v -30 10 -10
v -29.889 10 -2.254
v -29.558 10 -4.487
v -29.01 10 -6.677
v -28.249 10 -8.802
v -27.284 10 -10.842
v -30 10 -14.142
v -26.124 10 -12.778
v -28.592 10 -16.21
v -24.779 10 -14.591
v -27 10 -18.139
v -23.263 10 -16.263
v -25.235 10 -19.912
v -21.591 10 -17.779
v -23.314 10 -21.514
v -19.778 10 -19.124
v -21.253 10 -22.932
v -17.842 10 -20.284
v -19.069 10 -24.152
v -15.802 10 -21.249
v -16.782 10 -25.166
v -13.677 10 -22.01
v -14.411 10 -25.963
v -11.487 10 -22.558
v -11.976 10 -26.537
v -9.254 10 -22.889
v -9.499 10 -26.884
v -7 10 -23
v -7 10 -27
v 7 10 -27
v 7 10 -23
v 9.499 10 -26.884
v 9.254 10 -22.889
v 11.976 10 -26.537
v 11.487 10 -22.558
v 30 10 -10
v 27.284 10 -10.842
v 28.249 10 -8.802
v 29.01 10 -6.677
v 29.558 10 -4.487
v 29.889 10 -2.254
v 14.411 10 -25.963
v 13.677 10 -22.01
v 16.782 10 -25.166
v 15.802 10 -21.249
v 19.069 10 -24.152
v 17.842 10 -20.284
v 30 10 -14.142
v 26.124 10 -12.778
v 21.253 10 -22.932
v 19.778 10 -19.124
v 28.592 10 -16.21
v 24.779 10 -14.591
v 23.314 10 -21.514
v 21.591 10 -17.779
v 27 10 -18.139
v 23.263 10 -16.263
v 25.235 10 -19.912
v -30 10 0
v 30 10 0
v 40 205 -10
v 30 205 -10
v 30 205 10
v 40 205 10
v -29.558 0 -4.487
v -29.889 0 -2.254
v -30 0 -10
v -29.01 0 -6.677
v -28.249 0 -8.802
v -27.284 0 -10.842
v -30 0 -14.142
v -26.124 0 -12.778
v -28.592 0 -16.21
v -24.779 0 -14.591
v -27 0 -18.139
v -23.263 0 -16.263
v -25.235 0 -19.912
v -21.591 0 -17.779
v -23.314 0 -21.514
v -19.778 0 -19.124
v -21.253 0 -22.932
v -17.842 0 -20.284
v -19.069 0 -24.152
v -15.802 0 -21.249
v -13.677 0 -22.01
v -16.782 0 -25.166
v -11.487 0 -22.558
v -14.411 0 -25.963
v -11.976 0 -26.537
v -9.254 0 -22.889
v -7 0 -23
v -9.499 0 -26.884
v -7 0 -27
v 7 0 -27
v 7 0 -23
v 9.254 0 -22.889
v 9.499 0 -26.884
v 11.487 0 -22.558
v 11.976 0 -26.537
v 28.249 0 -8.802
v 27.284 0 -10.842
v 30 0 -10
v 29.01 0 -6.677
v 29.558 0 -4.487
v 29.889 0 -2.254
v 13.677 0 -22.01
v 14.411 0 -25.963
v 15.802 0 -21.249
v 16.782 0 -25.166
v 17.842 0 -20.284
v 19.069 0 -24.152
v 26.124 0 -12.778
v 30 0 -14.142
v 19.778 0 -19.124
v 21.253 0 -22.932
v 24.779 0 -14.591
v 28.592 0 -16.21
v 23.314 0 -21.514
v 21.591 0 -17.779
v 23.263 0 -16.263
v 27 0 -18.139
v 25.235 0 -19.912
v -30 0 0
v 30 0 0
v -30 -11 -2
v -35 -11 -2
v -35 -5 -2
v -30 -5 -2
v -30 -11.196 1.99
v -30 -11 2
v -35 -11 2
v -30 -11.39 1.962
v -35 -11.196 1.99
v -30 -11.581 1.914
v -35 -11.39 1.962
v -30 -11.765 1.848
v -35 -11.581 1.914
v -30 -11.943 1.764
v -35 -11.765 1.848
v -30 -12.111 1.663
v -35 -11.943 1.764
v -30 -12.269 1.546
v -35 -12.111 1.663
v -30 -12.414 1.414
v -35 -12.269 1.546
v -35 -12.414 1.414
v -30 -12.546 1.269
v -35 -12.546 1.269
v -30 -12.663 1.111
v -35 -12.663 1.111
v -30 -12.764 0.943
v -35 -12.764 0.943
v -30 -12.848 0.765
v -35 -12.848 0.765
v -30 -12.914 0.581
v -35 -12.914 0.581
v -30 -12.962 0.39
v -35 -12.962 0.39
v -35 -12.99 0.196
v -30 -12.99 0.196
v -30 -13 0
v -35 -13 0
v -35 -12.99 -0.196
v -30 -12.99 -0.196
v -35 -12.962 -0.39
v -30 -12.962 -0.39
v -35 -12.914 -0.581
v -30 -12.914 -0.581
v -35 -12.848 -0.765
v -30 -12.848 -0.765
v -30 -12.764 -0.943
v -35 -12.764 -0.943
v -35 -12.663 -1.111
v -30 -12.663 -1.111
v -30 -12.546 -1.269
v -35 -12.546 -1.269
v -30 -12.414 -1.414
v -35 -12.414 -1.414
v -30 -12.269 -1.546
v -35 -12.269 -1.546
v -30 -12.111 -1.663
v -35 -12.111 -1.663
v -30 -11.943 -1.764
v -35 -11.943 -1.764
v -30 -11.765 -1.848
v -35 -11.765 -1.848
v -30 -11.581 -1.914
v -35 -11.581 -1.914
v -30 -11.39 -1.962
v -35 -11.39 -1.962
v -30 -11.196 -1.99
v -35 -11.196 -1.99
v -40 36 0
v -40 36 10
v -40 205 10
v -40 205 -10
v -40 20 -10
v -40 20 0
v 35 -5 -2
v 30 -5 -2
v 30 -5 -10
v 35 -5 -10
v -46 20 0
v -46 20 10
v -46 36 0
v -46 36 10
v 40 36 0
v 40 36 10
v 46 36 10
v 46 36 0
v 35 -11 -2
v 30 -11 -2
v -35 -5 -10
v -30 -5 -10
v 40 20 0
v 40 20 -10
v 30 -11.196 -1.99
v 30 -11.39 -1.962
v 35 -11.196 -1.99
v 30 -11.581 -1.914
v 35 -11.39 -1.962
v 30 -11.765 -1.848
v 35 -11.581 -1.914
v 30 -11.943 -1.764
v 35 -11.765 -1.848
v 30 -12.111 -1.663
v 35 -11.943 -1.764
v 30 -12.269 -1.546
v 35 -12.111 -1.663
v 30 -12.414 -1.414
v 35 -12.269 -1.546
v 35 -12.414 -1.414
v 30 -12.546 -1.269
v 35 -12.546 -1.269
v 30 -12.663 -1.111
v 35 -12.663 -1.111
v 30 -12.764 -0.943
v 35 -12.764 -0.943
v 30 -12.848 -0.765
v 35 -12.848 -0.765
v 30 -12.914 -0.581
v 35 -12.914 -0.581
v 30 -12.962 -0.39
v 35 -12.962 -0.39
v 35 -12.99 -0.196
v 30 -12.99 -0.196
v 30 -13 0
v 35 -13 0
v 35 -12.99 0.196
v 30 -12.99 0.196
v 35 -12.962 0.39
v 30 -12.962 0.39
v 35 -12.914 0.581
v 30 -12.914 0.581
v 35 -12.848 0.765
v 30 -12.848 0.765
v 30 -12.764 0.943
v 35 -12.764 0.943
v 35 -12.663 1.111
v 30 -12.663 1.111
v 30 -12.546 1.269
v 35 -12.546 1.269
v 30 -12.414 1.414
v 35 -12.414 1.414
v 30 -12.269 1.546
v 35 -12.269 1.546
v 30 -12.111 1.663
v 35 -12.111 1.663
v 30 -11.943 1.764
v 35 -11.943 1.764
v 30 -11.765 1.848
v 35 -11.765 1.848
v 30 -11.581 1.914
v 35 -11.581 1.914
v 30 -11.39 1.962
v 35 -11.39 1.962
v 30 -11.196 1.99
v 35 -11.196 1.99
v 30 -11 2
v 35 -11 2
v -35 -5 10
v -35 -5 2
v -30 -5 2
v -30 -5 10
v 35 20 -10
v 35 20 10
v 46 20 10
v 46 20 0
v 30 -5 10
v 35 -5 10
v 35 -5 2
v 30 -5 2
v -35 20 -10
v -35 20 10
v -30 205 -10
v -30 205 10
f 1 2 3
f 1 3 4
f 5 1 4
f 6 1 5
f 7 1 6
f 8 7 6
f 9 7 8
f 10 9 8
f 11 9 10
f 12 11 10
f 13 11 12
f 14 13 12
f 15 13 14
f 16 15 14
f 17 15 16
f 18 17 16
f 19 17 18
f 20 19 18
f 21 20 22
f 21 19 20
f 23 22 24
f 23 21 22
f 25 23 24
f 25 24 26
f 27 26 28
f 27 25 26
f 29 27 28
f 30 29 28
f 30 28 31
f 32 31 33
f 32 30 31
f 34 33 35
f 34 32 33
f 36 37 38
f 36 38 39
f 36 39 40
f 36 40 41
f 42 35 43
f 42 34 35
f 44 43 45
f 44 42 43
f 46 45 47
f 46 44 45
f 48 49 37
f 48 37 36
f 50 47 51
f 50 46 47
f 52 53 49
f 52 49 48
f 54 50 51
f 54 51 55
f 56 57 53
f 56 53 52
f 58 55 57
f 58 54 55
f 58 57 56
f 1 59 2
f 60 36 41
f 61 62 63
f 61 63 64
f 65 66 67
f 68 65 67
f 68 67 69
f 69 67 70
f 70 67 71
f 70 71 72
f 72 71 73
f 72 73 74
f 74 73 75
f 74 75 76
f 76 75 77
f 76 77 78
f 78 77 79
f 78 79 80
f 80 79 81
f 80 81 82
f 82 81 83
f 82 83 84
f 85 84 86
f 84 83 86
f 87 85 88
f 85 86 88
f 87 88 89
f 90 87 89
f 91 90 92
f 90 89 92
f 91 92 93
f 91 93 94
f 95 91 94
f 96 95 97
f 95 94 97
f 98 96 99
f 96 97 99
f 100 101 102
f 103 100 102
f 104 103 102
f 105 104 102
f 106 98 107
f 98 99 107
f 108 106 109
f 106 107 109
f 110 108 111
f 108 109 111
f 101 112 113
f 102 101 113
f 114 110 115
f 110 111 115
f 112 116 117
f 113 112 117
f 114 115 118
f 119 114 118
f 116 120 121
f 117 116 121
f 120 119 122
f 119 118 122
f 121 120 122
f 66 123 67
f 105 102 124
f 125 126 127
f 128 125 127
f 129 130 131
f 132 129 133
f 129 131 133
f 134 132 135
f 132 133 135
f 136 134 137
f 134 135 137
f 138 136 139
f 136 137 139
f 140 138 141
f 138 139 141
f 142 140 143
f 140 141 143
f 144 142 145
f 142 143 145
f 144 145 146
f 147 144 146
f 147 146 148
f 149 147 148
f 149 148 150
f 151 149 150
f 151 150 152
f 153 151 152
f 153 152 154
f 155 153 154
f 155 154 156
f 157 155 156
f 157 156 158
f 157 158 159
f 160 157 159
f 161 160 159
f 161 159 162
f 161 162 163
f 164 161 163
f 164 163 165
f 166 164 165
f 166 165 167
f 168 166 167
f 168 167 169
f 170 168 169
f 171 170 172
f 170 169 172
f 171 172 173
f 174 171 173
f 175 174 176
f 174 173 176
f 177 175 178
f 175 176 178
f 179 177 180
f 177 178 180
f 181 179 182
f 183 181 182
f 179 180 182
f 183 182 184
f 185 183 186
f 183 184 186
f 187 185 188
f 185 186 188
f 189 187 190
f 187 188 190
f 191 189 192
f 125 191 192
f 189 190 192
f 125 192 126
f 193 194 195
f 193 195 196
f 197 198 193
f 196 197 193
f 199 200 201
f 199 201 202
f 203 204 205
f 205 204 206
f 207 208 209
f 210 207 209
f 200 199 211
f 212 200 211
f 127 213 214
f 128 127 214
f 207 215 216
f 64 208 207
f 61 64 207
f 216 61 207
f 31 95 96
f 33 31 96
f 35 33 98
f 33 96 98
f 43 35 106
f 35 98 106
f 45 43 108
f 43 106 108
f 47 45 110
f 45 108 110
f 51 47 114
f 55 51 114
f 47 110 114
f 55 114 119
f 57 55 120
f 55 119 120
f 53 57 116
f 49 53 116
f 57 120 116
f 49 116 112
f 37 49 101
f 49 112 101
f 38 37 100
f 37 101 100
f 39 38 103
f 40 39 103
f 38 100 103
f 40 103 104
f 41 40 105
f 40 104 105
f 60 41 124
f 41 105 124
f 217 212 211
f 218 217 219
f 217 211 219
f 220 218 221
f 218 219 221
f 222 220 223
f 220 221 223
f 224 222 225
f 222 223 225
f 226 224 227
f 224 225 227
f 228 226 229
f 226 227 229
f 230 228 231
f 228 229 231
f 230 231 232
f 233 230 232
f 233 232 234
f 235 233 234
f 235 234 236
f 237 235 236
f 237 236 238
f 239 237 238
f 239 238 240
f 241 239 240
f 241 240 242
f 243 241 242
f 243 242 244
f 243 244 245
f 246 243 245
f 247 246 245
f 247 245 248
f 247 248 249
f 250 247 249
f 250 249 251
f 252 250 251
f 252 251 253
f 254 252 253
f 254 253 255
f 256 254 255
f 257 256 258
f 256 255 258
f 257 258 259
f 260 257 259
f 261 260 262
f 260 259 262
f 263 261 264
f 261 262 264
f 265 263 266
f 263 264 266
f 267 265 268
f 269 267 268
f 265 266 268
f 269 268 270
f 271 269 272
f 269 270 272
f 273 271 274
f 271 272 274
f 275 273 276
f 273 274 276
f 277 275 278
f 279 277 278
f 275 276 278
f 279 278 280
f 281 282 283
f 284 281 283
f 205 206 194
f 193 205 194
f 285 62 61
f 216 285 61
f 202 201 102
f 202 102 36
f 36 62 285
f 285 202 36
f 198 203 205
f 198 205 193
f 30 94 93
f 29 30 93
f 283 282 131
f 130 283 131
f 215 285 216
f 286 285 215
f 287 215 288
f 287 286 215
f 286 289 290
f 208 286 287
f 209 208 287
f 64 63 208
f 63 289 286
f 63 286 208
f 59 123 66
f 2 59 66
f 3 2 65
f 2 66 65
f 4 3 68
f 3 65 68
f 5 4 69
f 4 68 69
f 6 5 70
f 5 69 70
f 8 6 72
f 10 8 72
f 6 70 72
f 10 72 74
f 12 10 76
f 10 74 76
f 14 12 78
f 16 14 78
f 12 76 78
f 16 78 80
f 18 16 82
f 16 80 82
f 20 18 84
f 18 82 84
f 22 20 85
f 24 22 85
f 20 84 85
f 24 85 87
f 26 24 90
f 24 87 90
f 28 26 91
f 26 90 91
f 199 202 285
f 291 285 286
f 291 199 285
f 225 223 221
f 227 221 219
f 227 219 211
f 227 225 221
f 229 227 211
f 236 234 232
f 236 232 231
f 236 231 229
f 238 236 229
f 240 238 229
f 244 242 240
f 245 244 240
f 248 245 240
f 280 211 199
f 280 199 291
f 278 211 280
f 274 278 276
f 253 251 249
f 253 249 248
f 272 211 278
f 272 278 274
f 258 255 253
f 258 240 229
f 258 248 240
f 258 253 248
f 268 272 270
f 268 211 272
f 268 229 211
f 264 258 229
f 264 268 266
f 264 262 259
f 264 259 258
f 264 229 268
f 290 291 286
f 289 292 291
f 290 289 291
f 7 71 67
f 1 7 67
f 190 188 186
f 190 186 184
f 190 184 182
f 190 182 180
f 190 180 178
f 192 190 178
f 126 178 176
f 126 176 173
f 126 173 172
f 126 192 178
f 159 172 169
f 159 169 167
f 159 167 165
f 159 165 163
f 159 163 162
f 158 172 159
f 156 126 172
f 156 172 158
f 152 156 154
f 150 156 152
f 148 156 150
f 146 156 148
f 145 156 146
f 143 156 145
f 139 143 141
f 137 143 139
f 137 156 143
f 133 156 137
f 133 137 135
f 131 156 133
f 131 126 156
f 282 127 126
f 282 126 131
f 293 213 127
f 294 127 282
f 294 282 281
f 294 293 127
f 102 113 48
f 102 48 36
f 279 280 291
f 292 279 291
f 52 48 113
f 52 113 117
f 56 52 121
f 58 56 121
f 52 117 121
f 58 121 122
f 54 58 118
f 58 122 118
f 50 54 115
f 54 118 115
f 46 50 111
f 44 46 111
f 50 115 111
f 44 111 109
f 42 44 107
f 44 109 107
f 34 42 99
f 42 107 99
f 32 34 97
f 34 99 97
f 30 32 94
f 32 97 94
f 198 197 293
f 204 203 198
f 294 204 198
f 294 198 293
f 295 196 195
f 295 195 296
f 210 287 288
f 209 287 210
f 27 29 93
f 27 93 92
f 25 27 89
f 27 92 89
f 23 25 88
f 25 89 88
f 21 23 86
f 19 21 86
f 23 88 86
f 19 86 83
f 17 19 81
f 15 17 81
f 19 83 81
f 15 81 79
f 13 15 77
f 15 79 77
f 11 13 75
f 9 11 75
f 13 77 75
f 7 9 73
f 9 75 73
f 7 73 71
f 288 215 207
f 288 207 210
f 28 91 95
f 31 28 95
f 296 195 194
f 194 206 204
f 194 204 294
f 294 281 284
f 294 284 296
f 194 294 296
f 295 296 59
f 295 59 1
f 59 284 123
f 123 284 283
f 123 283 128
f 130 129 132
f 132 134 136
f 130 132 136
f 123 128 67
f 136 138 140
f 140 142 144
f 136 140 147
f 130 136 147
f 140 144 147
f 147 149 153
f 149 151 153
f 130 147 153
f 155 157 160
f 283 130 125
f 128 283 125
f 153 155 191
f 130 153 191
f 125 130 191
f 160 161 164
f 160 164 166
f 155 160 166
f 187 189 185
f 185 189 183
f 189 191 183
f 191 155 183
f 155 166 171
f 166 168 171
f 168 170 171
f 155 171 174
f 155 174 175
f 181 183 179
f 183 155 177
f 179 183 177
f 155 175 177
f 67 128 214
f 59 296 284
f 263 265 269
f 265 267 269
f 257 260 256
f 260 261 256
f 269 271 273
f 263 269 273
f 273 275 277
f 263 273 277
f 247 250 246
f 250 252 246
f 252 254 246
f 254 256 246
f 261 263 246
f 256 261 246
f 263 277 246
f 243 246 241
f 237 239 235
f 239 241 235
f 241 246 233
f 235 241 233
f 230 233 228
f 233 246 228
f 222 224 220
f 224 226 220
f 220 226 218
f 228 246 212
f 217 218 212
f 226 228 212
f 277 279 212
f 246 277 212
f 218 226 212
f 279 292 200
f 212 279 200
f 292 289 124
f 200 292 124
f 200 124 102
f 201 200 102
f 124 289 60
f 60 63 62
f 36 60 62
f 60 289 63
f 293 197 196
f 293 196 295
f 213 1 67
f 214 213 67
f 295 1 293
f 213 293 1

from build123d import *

# Parameters (mm, degrees)
EXTRUDE_1_DEPTH     = 10
SKETCH_3_W          = 10
SKETCH_3_H          = 20
EXTRUDE_2_DEPTH     = 15
EXTRUDE_3_DEPTH     = 10
EXTRUDE_4_DEPTH     = 10
SKETCH_6_W          = 10
SKETCH_6_H          = 20
EXTRUDE_5_DEPTH     = 180
SKETCH_7_W          = 10.379175533
SKETCH_7_H          = 10.878140119
SKETCH_7_W_2        = 7.174479062
SKETCH_7_H_2        = 11.599196825
CUT_EXTRUDE_1_DEPTH = 211
SKETCH_8_W          = 5
SKETCH_8_H          = 20
CUT_EXTRUDE_2_DEPTH = 25
SKETCH_9_W          = 6
SKETCH_9_H          = 16
EXTRUDE_6_DEPTH     = 10


with BuildPart() as part:
    # 草图2 → 凸台-拉伸1 (new body)
    with BuildSketch(Plane(origin=(0, 0, 0), x_dir=(1, 0, 0), z_dir=(0, 1, 0))):
        with BuildLine():
            Line((-7, 23), (7, 23))
            ThreePointArc((7, 23), (23.263455967, 16.263455967), (30, 0))
            Line((30, 0), (34, 0))
            ThreePointArc((34, 0), (26.091883092, 19.091883092), (7, 27))
            Line((7, 27), (-7, 27))
            ThreePointArc((-7, 27), (-26.091883092, 19.091883092), (-34, 0))
            Line((-34, 0), (-30, 0))
            ThreePointArc((-30, 0), (-23.263455967, 16.263455967), (-7, 23))
        make_face()
    extrude(amount=EXTRUDE_1_DEPTH)

    # 草图3 → 凸台-拉伸2 (add, symmetric)
    with BuildSketch(Plane(origin=(0, 10, 0), x_dir=(1, 0, 0), z_dir=(0, 1, 0))):
        with Locations((-35, 0)):
            Rectangle(SKETCH_3_W, SKETCH_3_H)
        with Locations((35, 0)):
            Rectangle(SKETCH_3_W, SKETCH_3_H)
    extrude(amount=EXTRUDE_2_DEPTH, both=True)

    # 草图4 → 凸台-拉伸3 (add)
    with BuildSketch(Plane(origin=(40, 0, 0), x_dir=(0, 0, -1), z_dir=(1, 0, 0))):
        with BuildLine():
            Line((-2, -5), (2, -5))
            Line((2, -5), (2, -11))
            ThreePointArc((2, -11), (0, -13), (-2, -11))
            Line((-2, -11), (-2, -5))
        make_face()
    extrude(amount=-EXTRUDE_3_DEPTH)

    # 草图5 → 凸台-拉伸4 (add)
    with BuildSketch(Plane.ZY.offset(40)):
        with BuildLine():
            Line((-2, -5), (2, -5))
            Line((2, -5), (2, -11))
            ThreePointArc((2, -11), (0, -13), (-2, -11))
            Line((-2, -11), (-2, -5))
        make_face()
    extrude(amount=-EXTRUDE_4_DEPTH)

    # 草图6 → 凸台-拉伸5 (add)
    with BuildSketch(Plane(origin=(0, 25, 0), x_dir=(1, 0, 0), z_dir=(0, 1, 0))):
        with Locations((-35, 0)):
            Rectangle(SKETCH_6_W, SKETCH_6_H)
        with Locations((35, 0)):
            Rectangle(SKETCH_6_W, SKETCH_6_H)
    extrude(amount=EXTRUDE_5_DEPTH)

    # 草图7 → 切除-拉伸1 (cut, through all)
    with BuildSketch(Plane.XZ.offset(5)):
        with Locations((-35.189587767, -15.43907006)):
            Rectangle(SKETCH_7_W, SKETCH_7_H)
        with Locations((33.587239531, -15.799598412)):
            Rectangle(SKETCH_7_W_2, SKETCH_7_H_2)
    extrude(amount=-CUT_EXTRUDE_1_DEPTH, mode=Mode.SUBTRACT)

    # 草图8 → 切除-拉伸2 (cut, symmetric)
    with BuildSketch(Plane.XZ.offset(5)):
        with Locations((-37.5, 0)):
            Rectangle(SKETCH_8_W, SKETCH_8_H)
        with Locations((37.5, 0)):
            Rectangle(SKETCH_8_W, SKETCH_8_H)
    extrude(amount=CUT_EXTRUDE_2_DEPTH, both=True, mode=Mode.SUBTRACT)

    # 草图9 → 凸台-拉伸6 (add)
    with BuildSketch(Plane.XY.offset(10)):
        with Locations((43, 28)):
            Rectangle(SKETCH_9_W, SKETCH_9_H)
        with Locations((-43, 28)):
            Rectangle(SKETCH_9_W, SKETCH_9_H)
    extrude(amount=-EXTRUDE_6_DEPTH)


solid = part.part
